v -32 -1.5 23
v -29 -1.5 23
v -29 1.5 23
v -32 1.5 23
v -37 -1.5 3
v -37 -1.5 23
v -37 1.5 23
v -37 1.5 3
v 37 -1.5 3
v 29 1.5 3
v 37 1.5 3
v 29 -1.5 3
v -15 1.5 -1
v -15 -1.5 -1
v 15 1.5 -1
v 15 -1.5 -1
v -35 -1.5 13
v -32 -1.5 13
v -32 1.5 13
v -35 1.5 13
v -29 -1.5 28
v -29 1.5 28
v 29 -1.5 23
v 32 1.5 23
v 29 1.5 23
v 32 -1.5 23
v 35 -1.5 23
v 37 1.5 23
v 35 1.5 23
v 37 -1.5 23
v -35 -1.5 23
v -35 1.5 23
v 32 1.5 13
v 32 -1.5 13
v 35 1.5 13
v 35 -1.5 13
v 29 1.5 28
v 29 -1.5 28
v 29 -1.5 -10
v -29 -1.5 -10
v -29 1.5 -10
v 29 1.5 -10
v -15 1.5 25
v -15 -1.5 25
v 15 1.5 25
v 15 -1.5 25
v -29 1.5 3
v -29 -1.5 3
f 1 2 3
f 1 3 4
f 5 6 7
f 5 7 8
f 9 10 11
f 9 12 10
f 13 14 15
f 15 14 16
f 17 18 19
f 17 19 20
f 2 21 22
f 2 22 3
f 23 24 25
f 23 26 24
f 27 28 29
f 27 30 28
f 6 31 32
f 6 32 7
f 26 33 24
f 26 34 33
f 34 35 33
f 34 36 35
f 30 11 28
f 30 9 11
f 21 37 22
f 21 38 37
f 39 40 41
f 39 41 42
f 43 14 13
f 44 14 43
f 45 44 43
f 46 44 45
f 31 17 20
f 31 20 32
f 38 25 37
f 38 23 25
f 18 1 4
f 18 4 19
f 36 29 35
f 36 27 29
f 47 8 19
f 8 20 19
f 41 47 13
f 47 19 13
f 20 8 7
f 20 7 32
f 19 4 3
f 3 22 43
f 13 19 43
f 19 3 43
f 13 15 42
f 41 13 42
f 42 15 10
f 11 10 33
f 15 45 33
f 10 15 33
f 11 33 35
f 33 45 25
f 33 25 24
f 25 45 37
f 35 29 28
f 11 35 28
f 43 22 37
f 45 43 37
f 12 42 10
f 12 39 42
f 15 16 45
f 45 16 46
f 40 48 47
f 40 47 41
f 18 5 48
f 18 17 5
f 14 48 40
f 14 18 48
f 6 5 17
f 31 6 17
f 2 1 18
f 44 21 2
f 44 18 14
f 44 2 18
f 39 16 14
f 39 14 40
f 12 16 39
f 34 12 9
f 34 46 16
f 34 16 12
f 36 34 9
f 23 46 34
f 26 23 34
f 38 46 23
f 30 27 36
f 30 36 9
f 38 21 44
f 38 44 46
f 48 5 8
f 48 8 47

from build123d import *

# Parameters (mm, degrees)
F0_W     = 30
F0_H     = 26
F1_DEPTH = 1.5


with BuildPart() as f1:
    # F0 (on Front) → F1 (new body, symmetric)
    with BuildSketch(Plane.XZ):
        Polygon((29, 28), (-29, 28), (-29, 23), (-32, 23), (-32, 13), (-35, 13), (-35, 23), (-37, 23), (-37, 3), (-29, 3), (-29, -10), (29, -10), (29, 3), (37, 3), (37, 23), (35, 23), (35, 13), (32, 13), (32, 23), (29, 23), align=None)
        with Locations((0, 12)):
            Rectangle(F0_W, F0_H, mode=Mode.SUBTRACT)
    extrude(amount=F1_DEPTH, both=True)


solid = f1.part
